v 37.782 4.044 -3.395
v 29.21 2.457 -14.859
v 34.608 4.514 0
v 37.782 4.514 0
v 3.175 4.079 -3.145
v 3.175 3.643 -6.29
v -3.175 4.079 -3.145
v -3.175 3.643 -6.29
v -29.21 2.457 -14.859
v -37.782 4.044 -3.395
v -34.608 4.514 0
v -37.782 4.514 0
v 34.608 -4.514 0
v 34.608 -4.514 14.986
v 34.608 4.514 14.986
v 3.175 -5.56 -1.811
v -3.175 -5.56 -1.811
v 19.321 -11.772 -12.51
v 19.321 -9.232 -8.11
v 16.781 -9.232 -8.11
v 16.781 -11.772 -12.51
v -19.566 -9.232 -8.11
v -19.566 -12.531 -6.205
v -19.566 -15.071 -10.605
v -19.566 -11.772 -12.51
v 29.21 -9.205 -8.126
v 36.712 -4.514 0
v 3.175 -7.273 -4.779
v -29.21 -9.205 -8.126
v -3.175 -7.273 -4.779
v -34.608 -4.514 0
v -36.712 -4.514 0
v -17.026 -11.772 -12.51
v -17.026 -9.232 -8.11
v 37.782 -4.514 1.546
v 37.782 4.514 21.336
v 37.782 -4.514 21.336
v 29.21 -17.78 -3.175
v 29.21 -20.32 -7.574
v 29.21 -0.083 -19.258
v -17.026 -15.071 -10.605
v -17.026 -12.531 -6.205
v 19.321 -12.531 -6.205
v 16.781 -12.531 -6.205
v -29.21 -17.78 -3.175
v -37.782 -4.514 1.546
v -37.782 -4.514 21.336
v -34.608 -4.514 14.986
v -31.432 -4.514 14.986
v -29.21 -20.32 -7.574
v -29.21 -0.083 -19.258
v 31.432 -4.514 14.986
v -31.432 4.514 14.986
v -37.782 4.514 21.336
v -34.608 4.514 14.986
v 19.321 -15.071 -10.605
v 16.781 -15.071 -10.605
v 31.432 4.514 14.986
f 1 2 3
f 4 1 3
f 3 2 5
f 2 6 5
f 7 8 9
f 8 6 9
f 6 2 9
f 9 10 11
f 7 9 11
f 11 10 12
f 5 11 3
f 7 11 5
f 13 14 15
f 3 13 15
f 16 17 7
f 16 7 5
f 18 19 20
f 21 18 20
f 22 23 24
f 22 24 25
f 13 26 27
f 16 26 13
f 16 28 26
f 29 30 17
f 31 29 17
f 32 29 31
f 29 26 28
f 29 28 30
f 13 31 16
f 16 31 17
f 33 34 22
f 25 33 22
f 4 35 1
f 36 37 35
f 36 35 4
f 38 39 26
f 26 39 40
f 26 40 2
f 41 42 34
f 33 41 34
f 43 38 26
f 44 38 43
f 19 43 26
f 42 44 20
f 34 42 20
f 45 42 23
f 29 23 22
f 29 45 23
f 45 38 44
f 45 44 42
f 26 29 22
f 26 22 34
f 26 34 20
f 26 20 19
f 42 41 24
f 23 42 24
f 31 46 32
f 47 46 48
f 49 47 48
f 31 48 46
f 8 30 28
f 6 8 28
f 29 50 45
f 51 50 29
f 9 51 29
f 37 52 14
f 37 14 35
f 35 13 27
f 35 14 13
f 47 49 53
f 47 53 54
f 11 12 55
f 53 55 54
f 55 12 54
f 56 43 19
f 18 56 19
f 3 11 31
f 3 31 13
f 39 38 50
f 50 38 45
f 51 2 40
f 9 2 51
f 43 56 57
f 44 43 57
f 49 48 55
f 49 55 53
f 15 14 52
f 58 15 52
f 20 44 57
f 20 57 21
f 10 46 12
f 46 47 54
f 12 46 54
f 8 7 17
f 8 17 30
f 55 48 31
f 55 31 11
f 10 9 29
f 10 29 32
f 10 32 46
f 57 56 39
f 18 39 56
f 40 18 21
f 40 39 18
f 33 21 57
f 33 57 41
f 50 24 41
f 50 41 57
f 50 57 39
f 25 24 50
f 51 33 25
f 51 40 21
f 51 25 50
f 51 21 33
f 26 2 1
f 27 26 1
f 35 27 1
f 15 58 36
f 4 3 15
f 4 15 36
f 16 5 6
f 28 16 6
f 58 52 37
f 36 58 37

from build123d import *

# Parameters (mm, degrees)
SKETCH1_W                      = 75.565
SKETCH1_H                      = 35.56
BOSS_EXTRUDE1_DEPTH            = 3.175
SKETCH5_W                      = 12.7
SKETCH5_H                      = 3.175
BOSS_EXTRUDE3_DEPTH            = 14.986
SKETCH6_W                      = 3.175
SKETCH6_H                      = 9.028368652
BOSS_EXTRUDE4_DEPTH            = 14.986
BOSS_EXTRUDE5_DEPTH            = 12.7
BOSS_EXTRUDE6_DEPTH            = 9.028368652
BOSS_EXTRUDE7_DEPTH            = 75.565
SKETCH10_W                     = 75.565
SKETCH10_H                     = 23.368
BOSS_EXTRUDE8_DEPTH            = 5.08
CUT_EXTRUDE1_DEPTH             = 82.106081899
CUT_EXTRUDE2_REACH             = 52.218
SKETCH12_W                     = 6.35
SKETCH12_H                     = 3.175
CUT_EXTRUDE2_DIRECTION_2_DEPTH = 51.217629864
CUT_EXTRUDE3_DEPTH             = 55.104465738
CUT_EXTRUDE4_REACH             = 55.629
SKETCH14_W                     = 2.54
SKETCH14_H                     = 3.81


with BuildPart() as part:
    # Sketch1 → Boss-Extrude1 (new body)
    with BuildSketch(Plane.XY):
        Rectangle(SKETCH1_W, SKETCH1_H)
    extrude(amount=-BOSS_EXTRUDE1_DEPTH)

    # Sketch5 → Boss-Extrude3 (add)
    with BuildSketch(Plane.XY):
        with Locations((0, 16.1925)):
            Rectangle(SKETCH5_W, SKETCH5_H)
        with Locations((0, -16.1925)):
            Rectangle(SKETCH5_W, SKETCH5_H)
    extrude(amount=BOSS_EXTRUDE3_DEPTH)

    # Sketch6 → Boss-Extrude4 (add)
    with BuildSketch(Plane.XY):
        with Locations((-36.195, 0)):
            Rectangle(SKETCH6_W, SKETCH6_H)
        with Locations((36.195, 0)):
            Rectangle(SKETCH6_W, SKETCH6_H)
    extrude(amount=BOSS_EXTRUDE4_DEPTH)

    # Sketch7 → Boss-Extrude5 (add)
    with BuildSketch(Plane.ZY.offset(6.35)):
        Polygon((14.986, -17.78), (14.986, -11.43), (21.336, -17.78), align=None)
        Polygon((14.986, 17.78), (14.986, 11.43), (21.336, 17.78), align=None)
    extrude(amount=-BOSS_EXTRUDE5_DEPTH)

    # Sketch8 → Boss-Extrude6 (add)
    with BuildSketch(Plane.XZ.offset(4.514184326)):
        Polygon((-37.7825, 14.986), (-31.4325, 14.986), (-37.7825, 21.336), align=None)
        Polygon((37.7825, 14.986), (31.4325, 14.986), (37.7825, 21.336), align=None)
    extrude(amount=-BOSS_EXTRUDE6_DEPTH)

    # Sketch9 → Boss-Extrude7 (add)
    with BuildSketch(Plane.ZY.offset(37.7825)):
        Polygon((-3.175, 17.78), (-18.572931679, 8.89), (-3.175, -17.78), align=None)
    extrude(amount=-BOSS_EXTRUDE7_DEPTH)

    # Sketch10 → Boss-Extrude8 (add)
    with BuildSketch(Plane(origin=(0, -5.819815329, -10.08021584), x_dir=(-1, 0, 0), z_dir=(0, -0.5000000000000012, -0.866025403784438))):
        with Locations((0, -2.126431679)):
            Rectangle(SKETCH10_W, SKETCH10_H)
    extrude(amount=BOSS_EXTRUDE8_DEPTH)

    # Sketch11 → Cut-Extrude1 (cut, through all)
    with BuildSketch(Plane.ZY.offset(37.7825)):
        Polygon((-14.859, 2.457281636), (0, 4.514184326), (36.888684706, 18.275511072), (5.286071508, 25.150339228), (-30.3838484, 8.233222823), align=None)
        Polygon((-3.175, -17.78), (-8.125516688, -9.205453573), (0, -4.514184326), (40.158547499, -20.406390647), (15.599703883, -25.394905756), align=None)
    extrude(amount=-CUT_EXTRUDE1_DEPTH, mode=Mode.SUBTRACT)

    # Cut-Extrude2: up to this plane
    cut_extrude2_end = Plane(origin=(37.7825, -9.205453573, -8.125516688), z_dir=(0, 0.8660254037844387, -0.5))
    # Sketch12 → Cut-Extrude2 (cut, up to the surface)
    with BuildSketch(Plane(origin=(0, 4.429308453, -0.61314062), x_dir=(1, 0, 0), z_dir=(0, 0.9905543702216956, -0.13712052958875406)), mode=Mode.PRIVATE) as cut_extrude2_sk1:
        with Locations((0, 4.143512655)):
            Rectangle(SKETCH12_W, SKETCH12_H)
    cut_extrude2_tool1 = split(extrude(cut_extrude2_sk1.sketch, amount=-CUT_EXTRUDE2_REACH, mode=Mode.PRIVATE), bisect_by=cut_extrude2_end, keep=Keep.BOTH, mode=Mode.PRIVATE)
    add(cut_extrude2_tool1.solids().sort_by_distance((0, 3.861148, -4.717515))[0], mode=Mode.SUBTRACT)

    # Sketch12 → Cut-Extrude2 direction 2 (cut)
    with BuildSketch(Plane(origin=(0, 4.429308453, -0.61314062), x_dir=(1, 0, 0), z_dir=(0, 0.9905543702216956, -0.13712052958875406))):
        with Locations((0, 4.143512655)):
            Rectangle(SKETCH12_W, SKETCH12_H)
    extrude(amount=CUT_EXTRUDE2_DIRECTION_2_DEPTH, mode=Mode.SUBTRACT)

    # Sketch13 → Cut-Extrude3 (cut, through all)
    with BuildSketch(Plane(origin=(0, 8.277096964, -4.77878416), x_dir=(1, 0, 0), z_dir=(0, 0.866025403784438, -0.5000000000000012))):
        Polygon((-29.21, 11.639630657), (-37.7825, 0.917907837), (-37.7825, 11.639630657), (-37.7825, 16.719630657), (-29.21, 16.719630657), align=None)
        Polygon((37.7825, 0.917907837), (37.7825, 11.639630657), (37.7825, 16.719630657), (29.21, 16.719630657), (29.21, 11.639630657), align=None)
    extrude(amount=-CUT_EXTRUDE3_DEPTH, mode=Mode.SUBTRACT)

    # Sketch14 → Cut-Extrude4 (cut, up to next)
    with BuildSketch(Plane(origin=(0, -8.359815329, -14.479624891), x_dir=(-1, 0, 0), z_dir=(0, -0.5000000000000014, -0.8660254037844379)), mode=Mode.PRIVATE) as cut_extrude4_sk1:
        with Locations((-18.050542255, -5.844544168)):
            Rectangle(SKETCH14_W, SKETCH14_H)
    cut_extrude4_tool1 = extrude(cut_extrude4_sk1.sketch, amount=-CUT_EXTRUDE4_REACH, mode=Mode.PRIVATE) & part.part
    # Sketch14 → Cut-Extrude4 (cut, up to next)
    with BuildSketch(Plane(origin=(0, -8.359815329, -14.479624891), x_dir=(-1, 0, 0), z_dir=(0, -0.5000000000000014, -0.8660254037844379)), mode=Mode.PRIVATE) as cut_extrude4_sk2:
        with Locations((18.295855998, -5.844544168)):
            Rectangle(SKETCH14_W, SKETCH14_H)
    cut_extrude4_tool2 = extrude(cut_extrude4_sk2.sketch, amount=-CUT_EXTRUDE4_REACH, mode=Mode.PRIVATE) & part.part
    add(cut_extrude4_tool1.solids().sort_by_distance((18.050542, -13.421339, -11.557353))[0], mode=Mode.SUBTRACT)
    add(cut_extrude4_tool2.solids().sort_by_distance((-18.295856, -13.421339, -11.557353))[0], mode=Mode.SUBTRACT)


solid = part.part
